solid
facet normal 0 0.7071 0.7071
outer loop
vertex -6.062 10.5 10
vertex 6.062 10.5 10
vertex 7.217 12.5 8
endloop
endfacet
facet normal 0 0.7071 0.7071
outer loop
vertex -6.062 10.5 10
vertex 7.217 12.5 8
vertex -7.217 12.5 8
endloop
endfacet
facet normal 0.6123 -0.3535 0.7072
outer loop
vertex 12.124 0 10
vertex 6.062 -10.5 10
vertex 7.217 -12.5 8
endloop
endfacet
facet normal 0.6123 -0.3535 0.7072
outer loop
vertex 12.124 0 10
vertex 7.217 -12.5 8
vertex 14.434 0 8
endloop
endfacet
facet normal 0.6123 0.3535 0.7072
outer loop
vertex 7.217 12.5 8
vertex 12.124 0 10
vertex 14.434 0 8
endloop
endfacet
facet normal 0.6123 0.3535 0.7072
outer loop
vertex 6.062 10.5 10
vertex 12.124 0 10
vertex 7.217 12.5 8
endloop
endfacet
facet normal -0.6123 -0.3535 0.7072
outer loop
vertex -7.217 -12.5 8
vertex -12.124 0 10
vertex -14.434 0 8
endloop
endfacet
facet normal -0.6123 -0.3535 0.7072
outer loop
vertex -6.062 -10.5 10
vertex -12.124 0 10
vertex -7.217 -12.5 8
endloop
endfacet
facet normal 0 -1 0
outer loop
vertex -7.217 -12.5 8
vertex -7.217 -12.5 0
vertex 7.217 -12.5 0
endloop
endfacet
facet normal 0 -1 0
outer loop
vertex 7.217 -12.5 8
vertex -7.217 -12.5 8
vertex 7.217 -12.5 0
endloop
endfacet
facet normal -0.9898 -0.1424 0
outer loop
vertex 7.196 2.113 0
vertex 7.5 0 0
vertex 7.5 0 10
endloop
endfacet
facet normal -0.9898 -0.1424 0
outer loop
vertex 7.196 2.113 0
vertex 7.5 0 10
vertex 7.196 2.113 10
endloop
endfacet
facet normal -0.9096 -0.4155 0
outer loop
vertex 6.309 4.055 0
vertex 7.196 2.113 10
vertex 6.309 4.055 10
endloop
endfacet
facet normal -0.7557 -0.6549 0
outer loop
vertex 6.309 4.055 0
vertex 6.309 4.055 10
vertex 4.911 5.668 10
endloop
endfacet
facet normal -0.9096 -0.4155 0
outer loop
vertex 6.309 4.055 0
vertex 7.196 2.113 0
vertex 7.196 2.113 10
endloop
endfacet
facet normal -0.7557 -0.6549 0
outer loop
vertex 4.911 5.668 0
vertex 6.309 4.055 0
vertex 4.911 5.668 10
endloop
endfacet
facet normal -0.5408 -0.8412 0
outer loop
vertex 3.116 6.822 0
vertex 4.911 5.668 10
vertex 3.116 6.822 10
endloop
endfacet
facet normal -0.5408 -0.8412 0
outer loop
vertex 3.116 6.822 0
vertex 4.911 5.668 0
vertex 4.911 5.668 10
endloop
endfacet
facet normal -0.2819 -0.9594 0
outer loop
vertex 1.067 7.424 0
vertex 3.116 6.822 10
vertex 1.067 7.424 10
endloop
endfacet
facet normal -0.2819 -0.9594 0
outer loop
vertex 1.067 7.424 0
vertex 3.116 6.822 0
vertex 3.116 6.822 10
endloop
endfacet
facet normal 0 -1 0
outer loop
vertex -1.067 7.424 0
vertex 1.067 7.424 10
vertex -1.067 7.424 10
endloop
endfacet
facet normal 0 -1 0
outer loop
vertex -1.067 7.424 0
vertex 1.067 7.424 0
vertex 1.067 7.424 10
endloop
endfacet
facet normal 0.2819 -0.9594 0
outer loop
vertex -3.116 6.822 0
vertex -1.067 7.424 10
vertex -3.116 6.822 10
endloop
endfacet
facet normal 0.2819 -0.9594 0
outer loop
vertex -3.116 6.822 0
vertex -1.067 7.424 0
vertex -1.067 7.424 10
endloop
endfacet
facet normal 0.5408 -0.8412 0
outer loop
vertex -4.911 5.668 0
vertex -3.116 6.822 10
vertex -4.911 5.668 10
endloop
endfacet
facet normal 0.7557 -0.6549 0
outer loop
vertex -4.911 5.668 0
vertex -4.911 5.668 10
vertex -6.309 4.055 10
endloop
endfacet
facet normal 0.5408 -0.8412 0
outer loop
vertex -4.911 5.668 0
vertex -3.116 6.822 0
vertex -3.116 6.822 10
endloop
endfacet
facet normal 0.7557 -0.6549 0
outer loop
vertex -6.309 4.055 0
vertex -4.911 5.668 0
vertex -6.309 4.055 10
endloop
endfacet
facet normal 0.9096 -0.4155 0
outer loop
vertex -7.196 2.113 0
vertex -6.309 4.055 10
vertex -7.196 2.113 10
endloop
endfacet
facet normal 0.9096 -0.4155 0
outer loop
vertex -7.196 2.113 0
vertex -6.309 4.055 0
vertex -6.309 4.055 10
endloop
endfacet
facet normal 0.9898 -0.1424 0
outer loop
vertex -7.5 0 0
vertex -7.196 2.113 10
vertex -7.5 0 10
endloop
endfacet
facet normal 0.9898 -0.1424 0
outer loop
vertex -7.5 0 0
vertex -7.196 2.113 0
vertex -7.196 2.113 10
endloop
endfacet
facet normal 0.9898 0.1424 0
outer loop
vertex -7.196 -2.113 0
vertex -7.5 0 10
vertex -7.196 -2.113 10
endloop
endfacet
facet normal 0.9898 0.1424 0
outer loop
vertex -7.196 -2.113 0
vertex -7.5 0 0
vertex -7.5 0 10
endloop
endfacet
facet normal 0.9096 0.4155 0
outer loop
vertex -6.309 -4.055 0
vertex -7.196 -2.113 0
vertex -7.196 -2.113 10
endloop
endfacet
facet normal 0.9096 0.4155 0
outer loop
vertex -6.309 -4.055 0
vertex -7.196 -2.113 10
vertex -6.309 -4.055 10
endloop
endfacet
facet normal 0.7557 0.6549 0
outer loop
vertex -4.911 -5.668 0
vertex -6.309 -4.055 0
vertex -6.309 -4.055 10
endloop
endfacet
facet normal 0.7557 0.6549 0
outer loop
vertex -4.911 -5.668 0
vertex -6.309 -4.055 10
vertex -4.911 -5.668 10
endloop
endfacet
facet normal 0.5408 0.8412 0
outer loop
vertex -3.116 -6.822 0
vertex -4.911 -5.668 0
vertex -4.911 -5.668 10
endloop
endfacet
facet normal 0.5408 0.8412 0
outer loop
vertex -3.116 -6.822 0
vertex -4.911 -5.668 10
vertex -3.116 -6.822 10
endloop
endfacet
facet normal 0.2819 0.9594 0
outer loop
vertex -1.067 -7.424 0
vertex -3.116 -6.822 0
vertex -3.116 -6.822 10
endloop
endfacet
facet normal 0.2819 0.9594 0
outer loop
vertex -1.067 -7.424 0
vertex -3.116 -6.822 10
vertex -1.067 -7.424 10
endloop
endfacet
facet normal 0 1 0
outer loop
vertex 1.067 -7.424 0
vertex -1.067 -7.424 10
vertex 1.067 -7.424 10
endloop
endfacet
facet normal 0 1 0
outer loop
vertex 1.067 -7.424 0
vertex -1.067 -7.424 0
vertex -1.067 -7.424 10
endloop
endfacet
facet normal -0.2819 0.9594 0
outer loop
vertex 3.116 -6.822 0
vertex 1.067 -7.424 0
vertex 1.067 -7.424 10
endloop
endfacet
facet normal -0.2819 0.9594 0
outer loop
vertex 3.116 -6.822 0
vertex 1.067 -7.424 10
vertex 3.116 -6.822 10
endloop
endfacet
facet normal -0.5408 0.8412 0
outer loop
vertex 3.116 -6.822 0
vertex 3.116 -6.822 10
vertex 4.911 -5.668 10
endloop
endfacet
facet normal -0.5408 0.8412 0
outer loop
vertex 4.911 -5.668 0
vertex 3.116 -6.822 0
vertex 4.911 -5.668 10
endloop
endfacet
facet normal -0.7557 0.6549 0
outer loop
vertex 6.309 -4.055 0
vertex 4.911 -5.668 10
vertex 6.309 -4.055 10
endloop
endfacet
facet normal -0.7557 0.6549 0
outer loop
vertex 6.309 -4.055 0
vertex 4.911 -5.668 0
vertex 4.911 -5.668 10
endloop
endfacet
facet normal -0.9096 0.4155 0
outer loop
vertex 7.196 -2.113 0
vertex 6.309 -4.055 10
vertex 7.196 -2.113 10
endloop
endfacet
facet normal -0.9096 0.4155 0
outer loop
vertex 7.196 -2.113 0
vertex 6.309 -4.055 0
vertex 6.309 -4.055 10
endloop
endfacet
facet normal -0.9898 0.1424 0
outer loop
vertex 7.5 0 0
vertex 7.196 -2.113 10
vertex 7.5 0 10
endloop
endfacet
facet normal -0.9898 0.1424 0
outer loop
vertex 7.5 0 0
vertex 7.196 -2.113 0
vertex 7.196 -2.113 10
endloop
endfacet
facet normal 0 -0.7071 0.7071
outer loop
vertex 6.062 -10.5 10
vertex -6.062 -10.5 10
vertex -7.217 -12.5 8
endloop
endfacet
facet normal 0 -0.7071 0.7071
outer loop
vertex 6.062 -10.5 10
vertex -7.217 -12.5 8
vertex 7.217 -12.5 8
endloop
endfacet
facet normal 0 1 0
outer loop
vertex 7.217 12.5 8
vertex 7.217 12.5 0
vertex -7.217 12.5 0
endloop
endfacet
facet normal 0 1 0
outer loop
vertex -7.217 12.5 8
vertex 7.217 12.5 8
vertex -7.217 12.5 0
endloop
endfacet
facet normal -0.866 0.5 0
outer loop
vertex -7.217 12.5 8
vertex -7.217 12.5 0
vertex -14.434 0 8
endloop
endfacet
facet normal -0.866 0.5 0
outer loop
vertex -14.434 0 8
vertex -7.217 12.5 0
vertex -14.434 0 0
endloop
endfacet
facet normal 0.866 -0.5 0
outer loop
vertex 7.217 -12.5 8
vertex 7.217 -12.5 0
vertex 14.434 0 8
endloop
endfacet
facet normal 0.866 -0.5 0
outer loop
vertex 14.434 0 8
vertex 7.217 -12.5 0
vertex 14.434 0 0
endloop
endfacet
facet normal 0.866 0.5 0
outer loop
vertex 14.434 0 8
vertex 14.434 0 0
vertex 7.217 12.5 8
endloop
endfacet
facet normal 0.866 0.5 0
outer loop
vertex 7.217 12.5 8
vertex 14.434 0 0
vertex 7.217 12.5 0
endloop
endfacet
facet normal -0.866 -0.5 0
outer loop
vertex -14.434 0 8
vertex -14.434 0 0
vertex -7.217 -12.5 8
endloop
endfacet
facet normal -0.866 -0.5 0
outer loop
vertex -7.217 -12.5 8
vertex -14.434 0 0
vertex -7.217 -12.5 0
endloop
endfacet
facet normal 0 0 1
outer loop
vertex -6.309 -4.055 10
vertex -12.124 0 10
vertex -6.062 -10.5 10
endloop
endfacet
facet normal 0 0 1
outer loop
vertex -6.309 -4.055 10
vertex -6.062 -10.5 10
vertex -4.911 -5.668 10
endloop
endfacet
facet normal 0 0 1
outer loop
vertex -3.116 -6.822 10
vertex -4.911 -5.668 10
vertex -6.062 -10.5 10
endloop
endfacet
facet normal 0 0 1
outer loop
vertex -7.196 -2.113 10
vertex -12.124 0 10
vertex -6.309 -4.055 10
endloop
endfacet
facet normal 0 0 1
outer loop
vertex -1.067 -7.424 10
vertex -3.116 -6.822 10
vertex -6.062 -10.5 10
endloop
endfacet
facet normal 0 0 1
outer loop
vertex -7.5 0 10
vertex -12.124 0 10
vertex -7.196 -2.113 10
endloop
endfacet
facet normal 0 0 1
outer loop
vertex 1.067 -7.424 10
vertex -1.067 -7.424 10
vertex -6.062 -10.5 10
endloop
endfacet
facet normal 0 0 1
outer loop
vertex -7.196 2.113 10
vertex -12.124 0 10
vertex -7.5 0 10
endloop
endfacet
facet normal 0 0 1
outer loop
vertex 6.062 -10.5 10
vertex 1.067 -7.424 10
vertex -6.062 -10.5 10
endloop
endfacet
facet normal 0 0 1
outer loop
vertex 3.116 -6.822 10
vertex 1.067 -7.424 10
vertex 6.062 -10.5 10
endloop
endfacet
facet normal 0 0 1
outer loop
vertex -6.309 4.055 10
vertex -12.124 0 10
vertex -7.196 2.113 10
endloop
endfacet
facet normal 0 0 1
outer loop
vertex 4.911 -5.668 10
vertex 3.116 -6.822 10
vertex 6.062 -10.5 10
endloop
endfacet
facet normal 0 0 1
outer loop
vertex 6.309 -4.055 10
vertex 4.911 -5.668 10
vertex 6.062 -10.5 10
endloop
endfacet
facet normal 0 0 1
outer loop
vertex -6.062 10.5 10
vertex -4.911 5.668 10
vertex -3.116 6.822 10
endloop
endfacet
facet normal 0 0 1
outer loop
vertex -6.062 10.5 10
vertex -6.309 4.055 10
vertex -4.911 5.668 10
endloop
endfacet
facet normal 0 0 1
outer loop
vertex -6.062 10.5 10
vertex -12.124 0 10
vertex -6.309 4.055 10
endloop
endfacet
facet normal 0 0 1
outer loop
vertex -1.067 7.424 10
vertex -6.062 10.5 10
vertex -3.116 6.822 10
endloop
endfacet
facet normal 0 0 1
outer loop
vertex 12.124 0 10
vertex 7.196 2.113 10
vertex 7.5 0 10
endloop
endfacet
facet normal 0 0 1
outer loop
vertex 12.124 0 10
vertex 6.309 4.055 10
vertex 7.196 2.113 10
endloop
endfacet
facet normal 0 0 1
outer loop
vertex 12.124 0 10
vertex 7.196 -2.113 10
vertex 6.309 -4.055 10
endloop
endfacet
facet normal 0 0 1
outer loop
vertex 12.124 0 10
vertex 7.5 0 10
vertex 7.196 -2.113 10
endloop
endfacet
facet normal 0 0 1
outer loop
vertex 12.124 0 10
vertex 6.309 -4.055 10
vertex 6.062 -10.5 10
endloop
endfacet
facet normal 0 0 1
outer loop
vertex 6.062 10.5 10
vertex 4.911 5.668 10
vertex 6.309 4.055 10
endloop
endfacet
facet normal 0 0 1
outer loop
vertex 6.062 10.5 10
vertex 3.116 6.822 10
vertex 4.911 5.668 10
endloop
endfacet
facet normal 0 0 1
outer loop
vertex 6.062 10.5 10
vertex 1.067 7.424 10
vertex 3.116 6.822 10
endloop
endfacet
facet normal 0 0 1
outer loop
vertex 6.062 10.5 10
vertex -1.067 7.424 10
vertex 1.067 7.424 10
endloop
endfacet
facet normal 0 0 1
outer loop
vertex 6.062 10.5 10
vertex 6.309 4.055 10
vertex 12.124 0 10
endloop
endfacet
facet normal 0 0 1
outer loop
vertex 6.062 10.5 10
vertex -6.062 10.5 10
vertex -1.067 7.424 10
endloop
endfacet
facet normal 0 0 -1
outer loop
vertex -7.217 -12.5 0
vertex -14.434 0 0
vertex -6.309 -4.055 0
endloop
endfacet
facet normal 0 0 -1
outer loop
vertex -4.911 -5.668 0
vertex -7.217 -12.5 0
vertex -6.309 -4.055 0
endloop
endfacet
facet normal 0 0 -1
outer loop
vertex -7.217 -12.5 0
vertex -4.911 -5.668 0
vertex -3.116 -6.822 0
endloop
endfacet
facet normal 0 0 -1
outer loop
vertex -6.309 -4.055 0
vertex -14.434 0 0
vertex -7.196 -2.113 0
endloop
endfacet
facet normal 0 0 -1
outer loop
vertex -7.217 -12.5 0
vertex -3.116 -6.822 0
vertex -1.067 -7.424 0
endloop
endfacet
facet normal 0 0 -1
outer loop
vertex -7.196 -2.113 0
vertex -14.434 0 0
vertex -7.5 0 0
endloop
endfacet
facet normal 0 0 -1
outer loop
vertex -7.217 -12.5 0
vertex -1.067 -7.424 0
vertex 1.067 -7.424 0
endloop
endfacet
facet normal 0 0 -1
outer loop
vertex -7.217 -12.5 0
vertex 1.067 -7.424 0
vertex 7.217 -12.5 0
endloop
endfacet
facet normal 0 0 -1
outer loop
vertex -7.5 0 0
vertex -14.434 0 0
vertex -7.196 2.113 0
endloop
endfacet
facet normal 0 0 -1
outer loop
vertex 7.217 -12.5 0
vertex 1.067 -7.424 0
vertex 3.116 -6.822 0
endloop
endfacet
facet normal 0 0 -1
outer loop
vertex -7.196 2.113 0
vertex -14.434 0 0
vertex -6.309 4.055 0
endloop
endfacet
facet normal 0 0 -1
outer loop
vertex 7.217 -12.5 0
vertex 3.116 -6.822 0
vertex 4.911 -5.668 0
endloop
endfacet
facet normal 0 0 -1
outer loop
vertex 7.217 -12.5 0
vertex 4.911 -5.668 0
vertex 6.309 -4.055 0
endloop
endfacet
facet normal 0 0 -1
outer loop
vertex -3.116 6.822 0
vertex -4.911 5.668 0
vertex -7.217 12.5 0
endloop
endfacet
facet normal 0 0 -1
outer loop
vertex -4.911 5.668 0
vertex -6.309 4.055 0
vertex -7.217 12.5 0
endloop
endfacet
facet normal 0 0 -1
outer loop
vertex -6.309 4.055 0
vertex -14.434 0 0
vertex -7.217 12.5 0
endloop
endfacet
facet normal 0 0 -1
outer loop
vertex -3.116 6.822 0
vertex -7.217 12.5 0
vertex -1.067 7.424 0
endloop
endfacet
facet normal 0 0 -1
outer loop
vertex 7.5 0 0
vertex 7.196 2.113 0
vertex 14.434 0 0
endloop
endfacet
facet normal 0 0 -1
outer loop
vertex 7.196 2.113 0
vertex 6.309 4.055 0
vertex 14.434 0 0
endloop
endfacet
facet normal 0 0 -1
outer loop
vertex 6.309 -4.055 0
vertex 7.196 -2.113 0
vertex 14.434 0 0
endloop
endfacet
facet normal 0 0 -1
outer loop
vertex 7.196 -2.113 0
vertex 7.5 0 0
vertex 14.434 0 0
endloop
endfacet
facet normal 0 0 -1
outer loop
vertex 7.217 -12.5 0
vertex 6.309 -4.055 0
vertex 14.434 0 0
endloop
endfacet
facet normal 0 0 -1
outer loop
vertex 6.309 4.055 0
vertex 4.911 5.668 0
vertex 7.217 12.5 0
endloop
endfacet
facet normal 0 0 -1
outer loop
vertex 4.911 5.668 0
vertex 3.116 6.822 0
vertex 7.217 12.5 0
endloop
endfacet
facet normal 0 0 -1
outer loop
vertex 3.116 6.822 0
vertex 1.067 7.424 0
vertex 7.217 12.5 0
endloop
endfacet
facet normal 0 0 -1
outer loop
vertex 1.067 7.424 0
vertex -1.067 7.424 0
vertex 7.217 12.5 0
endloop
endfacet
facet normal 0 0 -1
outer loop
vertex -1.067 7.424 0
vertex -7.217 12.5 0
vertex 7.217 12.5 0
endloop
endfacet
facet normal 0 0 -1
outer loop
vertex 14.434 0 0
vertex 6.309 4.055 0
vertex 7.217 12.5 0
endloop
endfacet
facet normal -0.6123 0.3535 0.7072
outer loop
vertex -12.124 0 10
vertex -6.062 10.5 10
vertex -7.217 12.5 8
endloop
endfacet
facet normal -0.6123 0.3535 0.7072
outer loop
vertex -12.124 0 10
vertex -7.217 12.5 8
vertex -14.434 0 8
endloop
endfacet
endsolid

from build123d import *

# Parameters (mm, degrees)
SKETCH1_R           = 7.5
BOSS_EXTRUDE1_DEPTH = 10
CHAMFER1_SIZE       = 2


with BuildPart() as part:
    # Sketch1 → Boss-Extrude1 (new body)
    with BuildSketch(Plane.XY):
        Polygon((7.216878365, -12.5), (14.43375673, 0), (7.216878365, 12.5), (-7.216878365, 12.5), (-14.43375673, 0), (-7.216878365, -12.5), align=None)
        Circle(SKETCH1_R, mode=Mode.SUBTRACT)
    extrude(amount=BOSS_EXTRUDE1_DEPTH)

    # Chamfer1
    chamfer1_edges = [part.edges().sort_by_distance(p)[0] for p in [
        (10.825317547, 6.25, 10),
        (0, 12.5, 10),
        (-10.825317547, 6.25, 10),
        (-10.825317547, -6.25, 10),
        (0, -12.5, 10),
        (10.825317547, -6.25, 10),
    ]]
    chamfer(chamfer1_edges, length=CHAMFER1_SIZE)


solid = part.part
